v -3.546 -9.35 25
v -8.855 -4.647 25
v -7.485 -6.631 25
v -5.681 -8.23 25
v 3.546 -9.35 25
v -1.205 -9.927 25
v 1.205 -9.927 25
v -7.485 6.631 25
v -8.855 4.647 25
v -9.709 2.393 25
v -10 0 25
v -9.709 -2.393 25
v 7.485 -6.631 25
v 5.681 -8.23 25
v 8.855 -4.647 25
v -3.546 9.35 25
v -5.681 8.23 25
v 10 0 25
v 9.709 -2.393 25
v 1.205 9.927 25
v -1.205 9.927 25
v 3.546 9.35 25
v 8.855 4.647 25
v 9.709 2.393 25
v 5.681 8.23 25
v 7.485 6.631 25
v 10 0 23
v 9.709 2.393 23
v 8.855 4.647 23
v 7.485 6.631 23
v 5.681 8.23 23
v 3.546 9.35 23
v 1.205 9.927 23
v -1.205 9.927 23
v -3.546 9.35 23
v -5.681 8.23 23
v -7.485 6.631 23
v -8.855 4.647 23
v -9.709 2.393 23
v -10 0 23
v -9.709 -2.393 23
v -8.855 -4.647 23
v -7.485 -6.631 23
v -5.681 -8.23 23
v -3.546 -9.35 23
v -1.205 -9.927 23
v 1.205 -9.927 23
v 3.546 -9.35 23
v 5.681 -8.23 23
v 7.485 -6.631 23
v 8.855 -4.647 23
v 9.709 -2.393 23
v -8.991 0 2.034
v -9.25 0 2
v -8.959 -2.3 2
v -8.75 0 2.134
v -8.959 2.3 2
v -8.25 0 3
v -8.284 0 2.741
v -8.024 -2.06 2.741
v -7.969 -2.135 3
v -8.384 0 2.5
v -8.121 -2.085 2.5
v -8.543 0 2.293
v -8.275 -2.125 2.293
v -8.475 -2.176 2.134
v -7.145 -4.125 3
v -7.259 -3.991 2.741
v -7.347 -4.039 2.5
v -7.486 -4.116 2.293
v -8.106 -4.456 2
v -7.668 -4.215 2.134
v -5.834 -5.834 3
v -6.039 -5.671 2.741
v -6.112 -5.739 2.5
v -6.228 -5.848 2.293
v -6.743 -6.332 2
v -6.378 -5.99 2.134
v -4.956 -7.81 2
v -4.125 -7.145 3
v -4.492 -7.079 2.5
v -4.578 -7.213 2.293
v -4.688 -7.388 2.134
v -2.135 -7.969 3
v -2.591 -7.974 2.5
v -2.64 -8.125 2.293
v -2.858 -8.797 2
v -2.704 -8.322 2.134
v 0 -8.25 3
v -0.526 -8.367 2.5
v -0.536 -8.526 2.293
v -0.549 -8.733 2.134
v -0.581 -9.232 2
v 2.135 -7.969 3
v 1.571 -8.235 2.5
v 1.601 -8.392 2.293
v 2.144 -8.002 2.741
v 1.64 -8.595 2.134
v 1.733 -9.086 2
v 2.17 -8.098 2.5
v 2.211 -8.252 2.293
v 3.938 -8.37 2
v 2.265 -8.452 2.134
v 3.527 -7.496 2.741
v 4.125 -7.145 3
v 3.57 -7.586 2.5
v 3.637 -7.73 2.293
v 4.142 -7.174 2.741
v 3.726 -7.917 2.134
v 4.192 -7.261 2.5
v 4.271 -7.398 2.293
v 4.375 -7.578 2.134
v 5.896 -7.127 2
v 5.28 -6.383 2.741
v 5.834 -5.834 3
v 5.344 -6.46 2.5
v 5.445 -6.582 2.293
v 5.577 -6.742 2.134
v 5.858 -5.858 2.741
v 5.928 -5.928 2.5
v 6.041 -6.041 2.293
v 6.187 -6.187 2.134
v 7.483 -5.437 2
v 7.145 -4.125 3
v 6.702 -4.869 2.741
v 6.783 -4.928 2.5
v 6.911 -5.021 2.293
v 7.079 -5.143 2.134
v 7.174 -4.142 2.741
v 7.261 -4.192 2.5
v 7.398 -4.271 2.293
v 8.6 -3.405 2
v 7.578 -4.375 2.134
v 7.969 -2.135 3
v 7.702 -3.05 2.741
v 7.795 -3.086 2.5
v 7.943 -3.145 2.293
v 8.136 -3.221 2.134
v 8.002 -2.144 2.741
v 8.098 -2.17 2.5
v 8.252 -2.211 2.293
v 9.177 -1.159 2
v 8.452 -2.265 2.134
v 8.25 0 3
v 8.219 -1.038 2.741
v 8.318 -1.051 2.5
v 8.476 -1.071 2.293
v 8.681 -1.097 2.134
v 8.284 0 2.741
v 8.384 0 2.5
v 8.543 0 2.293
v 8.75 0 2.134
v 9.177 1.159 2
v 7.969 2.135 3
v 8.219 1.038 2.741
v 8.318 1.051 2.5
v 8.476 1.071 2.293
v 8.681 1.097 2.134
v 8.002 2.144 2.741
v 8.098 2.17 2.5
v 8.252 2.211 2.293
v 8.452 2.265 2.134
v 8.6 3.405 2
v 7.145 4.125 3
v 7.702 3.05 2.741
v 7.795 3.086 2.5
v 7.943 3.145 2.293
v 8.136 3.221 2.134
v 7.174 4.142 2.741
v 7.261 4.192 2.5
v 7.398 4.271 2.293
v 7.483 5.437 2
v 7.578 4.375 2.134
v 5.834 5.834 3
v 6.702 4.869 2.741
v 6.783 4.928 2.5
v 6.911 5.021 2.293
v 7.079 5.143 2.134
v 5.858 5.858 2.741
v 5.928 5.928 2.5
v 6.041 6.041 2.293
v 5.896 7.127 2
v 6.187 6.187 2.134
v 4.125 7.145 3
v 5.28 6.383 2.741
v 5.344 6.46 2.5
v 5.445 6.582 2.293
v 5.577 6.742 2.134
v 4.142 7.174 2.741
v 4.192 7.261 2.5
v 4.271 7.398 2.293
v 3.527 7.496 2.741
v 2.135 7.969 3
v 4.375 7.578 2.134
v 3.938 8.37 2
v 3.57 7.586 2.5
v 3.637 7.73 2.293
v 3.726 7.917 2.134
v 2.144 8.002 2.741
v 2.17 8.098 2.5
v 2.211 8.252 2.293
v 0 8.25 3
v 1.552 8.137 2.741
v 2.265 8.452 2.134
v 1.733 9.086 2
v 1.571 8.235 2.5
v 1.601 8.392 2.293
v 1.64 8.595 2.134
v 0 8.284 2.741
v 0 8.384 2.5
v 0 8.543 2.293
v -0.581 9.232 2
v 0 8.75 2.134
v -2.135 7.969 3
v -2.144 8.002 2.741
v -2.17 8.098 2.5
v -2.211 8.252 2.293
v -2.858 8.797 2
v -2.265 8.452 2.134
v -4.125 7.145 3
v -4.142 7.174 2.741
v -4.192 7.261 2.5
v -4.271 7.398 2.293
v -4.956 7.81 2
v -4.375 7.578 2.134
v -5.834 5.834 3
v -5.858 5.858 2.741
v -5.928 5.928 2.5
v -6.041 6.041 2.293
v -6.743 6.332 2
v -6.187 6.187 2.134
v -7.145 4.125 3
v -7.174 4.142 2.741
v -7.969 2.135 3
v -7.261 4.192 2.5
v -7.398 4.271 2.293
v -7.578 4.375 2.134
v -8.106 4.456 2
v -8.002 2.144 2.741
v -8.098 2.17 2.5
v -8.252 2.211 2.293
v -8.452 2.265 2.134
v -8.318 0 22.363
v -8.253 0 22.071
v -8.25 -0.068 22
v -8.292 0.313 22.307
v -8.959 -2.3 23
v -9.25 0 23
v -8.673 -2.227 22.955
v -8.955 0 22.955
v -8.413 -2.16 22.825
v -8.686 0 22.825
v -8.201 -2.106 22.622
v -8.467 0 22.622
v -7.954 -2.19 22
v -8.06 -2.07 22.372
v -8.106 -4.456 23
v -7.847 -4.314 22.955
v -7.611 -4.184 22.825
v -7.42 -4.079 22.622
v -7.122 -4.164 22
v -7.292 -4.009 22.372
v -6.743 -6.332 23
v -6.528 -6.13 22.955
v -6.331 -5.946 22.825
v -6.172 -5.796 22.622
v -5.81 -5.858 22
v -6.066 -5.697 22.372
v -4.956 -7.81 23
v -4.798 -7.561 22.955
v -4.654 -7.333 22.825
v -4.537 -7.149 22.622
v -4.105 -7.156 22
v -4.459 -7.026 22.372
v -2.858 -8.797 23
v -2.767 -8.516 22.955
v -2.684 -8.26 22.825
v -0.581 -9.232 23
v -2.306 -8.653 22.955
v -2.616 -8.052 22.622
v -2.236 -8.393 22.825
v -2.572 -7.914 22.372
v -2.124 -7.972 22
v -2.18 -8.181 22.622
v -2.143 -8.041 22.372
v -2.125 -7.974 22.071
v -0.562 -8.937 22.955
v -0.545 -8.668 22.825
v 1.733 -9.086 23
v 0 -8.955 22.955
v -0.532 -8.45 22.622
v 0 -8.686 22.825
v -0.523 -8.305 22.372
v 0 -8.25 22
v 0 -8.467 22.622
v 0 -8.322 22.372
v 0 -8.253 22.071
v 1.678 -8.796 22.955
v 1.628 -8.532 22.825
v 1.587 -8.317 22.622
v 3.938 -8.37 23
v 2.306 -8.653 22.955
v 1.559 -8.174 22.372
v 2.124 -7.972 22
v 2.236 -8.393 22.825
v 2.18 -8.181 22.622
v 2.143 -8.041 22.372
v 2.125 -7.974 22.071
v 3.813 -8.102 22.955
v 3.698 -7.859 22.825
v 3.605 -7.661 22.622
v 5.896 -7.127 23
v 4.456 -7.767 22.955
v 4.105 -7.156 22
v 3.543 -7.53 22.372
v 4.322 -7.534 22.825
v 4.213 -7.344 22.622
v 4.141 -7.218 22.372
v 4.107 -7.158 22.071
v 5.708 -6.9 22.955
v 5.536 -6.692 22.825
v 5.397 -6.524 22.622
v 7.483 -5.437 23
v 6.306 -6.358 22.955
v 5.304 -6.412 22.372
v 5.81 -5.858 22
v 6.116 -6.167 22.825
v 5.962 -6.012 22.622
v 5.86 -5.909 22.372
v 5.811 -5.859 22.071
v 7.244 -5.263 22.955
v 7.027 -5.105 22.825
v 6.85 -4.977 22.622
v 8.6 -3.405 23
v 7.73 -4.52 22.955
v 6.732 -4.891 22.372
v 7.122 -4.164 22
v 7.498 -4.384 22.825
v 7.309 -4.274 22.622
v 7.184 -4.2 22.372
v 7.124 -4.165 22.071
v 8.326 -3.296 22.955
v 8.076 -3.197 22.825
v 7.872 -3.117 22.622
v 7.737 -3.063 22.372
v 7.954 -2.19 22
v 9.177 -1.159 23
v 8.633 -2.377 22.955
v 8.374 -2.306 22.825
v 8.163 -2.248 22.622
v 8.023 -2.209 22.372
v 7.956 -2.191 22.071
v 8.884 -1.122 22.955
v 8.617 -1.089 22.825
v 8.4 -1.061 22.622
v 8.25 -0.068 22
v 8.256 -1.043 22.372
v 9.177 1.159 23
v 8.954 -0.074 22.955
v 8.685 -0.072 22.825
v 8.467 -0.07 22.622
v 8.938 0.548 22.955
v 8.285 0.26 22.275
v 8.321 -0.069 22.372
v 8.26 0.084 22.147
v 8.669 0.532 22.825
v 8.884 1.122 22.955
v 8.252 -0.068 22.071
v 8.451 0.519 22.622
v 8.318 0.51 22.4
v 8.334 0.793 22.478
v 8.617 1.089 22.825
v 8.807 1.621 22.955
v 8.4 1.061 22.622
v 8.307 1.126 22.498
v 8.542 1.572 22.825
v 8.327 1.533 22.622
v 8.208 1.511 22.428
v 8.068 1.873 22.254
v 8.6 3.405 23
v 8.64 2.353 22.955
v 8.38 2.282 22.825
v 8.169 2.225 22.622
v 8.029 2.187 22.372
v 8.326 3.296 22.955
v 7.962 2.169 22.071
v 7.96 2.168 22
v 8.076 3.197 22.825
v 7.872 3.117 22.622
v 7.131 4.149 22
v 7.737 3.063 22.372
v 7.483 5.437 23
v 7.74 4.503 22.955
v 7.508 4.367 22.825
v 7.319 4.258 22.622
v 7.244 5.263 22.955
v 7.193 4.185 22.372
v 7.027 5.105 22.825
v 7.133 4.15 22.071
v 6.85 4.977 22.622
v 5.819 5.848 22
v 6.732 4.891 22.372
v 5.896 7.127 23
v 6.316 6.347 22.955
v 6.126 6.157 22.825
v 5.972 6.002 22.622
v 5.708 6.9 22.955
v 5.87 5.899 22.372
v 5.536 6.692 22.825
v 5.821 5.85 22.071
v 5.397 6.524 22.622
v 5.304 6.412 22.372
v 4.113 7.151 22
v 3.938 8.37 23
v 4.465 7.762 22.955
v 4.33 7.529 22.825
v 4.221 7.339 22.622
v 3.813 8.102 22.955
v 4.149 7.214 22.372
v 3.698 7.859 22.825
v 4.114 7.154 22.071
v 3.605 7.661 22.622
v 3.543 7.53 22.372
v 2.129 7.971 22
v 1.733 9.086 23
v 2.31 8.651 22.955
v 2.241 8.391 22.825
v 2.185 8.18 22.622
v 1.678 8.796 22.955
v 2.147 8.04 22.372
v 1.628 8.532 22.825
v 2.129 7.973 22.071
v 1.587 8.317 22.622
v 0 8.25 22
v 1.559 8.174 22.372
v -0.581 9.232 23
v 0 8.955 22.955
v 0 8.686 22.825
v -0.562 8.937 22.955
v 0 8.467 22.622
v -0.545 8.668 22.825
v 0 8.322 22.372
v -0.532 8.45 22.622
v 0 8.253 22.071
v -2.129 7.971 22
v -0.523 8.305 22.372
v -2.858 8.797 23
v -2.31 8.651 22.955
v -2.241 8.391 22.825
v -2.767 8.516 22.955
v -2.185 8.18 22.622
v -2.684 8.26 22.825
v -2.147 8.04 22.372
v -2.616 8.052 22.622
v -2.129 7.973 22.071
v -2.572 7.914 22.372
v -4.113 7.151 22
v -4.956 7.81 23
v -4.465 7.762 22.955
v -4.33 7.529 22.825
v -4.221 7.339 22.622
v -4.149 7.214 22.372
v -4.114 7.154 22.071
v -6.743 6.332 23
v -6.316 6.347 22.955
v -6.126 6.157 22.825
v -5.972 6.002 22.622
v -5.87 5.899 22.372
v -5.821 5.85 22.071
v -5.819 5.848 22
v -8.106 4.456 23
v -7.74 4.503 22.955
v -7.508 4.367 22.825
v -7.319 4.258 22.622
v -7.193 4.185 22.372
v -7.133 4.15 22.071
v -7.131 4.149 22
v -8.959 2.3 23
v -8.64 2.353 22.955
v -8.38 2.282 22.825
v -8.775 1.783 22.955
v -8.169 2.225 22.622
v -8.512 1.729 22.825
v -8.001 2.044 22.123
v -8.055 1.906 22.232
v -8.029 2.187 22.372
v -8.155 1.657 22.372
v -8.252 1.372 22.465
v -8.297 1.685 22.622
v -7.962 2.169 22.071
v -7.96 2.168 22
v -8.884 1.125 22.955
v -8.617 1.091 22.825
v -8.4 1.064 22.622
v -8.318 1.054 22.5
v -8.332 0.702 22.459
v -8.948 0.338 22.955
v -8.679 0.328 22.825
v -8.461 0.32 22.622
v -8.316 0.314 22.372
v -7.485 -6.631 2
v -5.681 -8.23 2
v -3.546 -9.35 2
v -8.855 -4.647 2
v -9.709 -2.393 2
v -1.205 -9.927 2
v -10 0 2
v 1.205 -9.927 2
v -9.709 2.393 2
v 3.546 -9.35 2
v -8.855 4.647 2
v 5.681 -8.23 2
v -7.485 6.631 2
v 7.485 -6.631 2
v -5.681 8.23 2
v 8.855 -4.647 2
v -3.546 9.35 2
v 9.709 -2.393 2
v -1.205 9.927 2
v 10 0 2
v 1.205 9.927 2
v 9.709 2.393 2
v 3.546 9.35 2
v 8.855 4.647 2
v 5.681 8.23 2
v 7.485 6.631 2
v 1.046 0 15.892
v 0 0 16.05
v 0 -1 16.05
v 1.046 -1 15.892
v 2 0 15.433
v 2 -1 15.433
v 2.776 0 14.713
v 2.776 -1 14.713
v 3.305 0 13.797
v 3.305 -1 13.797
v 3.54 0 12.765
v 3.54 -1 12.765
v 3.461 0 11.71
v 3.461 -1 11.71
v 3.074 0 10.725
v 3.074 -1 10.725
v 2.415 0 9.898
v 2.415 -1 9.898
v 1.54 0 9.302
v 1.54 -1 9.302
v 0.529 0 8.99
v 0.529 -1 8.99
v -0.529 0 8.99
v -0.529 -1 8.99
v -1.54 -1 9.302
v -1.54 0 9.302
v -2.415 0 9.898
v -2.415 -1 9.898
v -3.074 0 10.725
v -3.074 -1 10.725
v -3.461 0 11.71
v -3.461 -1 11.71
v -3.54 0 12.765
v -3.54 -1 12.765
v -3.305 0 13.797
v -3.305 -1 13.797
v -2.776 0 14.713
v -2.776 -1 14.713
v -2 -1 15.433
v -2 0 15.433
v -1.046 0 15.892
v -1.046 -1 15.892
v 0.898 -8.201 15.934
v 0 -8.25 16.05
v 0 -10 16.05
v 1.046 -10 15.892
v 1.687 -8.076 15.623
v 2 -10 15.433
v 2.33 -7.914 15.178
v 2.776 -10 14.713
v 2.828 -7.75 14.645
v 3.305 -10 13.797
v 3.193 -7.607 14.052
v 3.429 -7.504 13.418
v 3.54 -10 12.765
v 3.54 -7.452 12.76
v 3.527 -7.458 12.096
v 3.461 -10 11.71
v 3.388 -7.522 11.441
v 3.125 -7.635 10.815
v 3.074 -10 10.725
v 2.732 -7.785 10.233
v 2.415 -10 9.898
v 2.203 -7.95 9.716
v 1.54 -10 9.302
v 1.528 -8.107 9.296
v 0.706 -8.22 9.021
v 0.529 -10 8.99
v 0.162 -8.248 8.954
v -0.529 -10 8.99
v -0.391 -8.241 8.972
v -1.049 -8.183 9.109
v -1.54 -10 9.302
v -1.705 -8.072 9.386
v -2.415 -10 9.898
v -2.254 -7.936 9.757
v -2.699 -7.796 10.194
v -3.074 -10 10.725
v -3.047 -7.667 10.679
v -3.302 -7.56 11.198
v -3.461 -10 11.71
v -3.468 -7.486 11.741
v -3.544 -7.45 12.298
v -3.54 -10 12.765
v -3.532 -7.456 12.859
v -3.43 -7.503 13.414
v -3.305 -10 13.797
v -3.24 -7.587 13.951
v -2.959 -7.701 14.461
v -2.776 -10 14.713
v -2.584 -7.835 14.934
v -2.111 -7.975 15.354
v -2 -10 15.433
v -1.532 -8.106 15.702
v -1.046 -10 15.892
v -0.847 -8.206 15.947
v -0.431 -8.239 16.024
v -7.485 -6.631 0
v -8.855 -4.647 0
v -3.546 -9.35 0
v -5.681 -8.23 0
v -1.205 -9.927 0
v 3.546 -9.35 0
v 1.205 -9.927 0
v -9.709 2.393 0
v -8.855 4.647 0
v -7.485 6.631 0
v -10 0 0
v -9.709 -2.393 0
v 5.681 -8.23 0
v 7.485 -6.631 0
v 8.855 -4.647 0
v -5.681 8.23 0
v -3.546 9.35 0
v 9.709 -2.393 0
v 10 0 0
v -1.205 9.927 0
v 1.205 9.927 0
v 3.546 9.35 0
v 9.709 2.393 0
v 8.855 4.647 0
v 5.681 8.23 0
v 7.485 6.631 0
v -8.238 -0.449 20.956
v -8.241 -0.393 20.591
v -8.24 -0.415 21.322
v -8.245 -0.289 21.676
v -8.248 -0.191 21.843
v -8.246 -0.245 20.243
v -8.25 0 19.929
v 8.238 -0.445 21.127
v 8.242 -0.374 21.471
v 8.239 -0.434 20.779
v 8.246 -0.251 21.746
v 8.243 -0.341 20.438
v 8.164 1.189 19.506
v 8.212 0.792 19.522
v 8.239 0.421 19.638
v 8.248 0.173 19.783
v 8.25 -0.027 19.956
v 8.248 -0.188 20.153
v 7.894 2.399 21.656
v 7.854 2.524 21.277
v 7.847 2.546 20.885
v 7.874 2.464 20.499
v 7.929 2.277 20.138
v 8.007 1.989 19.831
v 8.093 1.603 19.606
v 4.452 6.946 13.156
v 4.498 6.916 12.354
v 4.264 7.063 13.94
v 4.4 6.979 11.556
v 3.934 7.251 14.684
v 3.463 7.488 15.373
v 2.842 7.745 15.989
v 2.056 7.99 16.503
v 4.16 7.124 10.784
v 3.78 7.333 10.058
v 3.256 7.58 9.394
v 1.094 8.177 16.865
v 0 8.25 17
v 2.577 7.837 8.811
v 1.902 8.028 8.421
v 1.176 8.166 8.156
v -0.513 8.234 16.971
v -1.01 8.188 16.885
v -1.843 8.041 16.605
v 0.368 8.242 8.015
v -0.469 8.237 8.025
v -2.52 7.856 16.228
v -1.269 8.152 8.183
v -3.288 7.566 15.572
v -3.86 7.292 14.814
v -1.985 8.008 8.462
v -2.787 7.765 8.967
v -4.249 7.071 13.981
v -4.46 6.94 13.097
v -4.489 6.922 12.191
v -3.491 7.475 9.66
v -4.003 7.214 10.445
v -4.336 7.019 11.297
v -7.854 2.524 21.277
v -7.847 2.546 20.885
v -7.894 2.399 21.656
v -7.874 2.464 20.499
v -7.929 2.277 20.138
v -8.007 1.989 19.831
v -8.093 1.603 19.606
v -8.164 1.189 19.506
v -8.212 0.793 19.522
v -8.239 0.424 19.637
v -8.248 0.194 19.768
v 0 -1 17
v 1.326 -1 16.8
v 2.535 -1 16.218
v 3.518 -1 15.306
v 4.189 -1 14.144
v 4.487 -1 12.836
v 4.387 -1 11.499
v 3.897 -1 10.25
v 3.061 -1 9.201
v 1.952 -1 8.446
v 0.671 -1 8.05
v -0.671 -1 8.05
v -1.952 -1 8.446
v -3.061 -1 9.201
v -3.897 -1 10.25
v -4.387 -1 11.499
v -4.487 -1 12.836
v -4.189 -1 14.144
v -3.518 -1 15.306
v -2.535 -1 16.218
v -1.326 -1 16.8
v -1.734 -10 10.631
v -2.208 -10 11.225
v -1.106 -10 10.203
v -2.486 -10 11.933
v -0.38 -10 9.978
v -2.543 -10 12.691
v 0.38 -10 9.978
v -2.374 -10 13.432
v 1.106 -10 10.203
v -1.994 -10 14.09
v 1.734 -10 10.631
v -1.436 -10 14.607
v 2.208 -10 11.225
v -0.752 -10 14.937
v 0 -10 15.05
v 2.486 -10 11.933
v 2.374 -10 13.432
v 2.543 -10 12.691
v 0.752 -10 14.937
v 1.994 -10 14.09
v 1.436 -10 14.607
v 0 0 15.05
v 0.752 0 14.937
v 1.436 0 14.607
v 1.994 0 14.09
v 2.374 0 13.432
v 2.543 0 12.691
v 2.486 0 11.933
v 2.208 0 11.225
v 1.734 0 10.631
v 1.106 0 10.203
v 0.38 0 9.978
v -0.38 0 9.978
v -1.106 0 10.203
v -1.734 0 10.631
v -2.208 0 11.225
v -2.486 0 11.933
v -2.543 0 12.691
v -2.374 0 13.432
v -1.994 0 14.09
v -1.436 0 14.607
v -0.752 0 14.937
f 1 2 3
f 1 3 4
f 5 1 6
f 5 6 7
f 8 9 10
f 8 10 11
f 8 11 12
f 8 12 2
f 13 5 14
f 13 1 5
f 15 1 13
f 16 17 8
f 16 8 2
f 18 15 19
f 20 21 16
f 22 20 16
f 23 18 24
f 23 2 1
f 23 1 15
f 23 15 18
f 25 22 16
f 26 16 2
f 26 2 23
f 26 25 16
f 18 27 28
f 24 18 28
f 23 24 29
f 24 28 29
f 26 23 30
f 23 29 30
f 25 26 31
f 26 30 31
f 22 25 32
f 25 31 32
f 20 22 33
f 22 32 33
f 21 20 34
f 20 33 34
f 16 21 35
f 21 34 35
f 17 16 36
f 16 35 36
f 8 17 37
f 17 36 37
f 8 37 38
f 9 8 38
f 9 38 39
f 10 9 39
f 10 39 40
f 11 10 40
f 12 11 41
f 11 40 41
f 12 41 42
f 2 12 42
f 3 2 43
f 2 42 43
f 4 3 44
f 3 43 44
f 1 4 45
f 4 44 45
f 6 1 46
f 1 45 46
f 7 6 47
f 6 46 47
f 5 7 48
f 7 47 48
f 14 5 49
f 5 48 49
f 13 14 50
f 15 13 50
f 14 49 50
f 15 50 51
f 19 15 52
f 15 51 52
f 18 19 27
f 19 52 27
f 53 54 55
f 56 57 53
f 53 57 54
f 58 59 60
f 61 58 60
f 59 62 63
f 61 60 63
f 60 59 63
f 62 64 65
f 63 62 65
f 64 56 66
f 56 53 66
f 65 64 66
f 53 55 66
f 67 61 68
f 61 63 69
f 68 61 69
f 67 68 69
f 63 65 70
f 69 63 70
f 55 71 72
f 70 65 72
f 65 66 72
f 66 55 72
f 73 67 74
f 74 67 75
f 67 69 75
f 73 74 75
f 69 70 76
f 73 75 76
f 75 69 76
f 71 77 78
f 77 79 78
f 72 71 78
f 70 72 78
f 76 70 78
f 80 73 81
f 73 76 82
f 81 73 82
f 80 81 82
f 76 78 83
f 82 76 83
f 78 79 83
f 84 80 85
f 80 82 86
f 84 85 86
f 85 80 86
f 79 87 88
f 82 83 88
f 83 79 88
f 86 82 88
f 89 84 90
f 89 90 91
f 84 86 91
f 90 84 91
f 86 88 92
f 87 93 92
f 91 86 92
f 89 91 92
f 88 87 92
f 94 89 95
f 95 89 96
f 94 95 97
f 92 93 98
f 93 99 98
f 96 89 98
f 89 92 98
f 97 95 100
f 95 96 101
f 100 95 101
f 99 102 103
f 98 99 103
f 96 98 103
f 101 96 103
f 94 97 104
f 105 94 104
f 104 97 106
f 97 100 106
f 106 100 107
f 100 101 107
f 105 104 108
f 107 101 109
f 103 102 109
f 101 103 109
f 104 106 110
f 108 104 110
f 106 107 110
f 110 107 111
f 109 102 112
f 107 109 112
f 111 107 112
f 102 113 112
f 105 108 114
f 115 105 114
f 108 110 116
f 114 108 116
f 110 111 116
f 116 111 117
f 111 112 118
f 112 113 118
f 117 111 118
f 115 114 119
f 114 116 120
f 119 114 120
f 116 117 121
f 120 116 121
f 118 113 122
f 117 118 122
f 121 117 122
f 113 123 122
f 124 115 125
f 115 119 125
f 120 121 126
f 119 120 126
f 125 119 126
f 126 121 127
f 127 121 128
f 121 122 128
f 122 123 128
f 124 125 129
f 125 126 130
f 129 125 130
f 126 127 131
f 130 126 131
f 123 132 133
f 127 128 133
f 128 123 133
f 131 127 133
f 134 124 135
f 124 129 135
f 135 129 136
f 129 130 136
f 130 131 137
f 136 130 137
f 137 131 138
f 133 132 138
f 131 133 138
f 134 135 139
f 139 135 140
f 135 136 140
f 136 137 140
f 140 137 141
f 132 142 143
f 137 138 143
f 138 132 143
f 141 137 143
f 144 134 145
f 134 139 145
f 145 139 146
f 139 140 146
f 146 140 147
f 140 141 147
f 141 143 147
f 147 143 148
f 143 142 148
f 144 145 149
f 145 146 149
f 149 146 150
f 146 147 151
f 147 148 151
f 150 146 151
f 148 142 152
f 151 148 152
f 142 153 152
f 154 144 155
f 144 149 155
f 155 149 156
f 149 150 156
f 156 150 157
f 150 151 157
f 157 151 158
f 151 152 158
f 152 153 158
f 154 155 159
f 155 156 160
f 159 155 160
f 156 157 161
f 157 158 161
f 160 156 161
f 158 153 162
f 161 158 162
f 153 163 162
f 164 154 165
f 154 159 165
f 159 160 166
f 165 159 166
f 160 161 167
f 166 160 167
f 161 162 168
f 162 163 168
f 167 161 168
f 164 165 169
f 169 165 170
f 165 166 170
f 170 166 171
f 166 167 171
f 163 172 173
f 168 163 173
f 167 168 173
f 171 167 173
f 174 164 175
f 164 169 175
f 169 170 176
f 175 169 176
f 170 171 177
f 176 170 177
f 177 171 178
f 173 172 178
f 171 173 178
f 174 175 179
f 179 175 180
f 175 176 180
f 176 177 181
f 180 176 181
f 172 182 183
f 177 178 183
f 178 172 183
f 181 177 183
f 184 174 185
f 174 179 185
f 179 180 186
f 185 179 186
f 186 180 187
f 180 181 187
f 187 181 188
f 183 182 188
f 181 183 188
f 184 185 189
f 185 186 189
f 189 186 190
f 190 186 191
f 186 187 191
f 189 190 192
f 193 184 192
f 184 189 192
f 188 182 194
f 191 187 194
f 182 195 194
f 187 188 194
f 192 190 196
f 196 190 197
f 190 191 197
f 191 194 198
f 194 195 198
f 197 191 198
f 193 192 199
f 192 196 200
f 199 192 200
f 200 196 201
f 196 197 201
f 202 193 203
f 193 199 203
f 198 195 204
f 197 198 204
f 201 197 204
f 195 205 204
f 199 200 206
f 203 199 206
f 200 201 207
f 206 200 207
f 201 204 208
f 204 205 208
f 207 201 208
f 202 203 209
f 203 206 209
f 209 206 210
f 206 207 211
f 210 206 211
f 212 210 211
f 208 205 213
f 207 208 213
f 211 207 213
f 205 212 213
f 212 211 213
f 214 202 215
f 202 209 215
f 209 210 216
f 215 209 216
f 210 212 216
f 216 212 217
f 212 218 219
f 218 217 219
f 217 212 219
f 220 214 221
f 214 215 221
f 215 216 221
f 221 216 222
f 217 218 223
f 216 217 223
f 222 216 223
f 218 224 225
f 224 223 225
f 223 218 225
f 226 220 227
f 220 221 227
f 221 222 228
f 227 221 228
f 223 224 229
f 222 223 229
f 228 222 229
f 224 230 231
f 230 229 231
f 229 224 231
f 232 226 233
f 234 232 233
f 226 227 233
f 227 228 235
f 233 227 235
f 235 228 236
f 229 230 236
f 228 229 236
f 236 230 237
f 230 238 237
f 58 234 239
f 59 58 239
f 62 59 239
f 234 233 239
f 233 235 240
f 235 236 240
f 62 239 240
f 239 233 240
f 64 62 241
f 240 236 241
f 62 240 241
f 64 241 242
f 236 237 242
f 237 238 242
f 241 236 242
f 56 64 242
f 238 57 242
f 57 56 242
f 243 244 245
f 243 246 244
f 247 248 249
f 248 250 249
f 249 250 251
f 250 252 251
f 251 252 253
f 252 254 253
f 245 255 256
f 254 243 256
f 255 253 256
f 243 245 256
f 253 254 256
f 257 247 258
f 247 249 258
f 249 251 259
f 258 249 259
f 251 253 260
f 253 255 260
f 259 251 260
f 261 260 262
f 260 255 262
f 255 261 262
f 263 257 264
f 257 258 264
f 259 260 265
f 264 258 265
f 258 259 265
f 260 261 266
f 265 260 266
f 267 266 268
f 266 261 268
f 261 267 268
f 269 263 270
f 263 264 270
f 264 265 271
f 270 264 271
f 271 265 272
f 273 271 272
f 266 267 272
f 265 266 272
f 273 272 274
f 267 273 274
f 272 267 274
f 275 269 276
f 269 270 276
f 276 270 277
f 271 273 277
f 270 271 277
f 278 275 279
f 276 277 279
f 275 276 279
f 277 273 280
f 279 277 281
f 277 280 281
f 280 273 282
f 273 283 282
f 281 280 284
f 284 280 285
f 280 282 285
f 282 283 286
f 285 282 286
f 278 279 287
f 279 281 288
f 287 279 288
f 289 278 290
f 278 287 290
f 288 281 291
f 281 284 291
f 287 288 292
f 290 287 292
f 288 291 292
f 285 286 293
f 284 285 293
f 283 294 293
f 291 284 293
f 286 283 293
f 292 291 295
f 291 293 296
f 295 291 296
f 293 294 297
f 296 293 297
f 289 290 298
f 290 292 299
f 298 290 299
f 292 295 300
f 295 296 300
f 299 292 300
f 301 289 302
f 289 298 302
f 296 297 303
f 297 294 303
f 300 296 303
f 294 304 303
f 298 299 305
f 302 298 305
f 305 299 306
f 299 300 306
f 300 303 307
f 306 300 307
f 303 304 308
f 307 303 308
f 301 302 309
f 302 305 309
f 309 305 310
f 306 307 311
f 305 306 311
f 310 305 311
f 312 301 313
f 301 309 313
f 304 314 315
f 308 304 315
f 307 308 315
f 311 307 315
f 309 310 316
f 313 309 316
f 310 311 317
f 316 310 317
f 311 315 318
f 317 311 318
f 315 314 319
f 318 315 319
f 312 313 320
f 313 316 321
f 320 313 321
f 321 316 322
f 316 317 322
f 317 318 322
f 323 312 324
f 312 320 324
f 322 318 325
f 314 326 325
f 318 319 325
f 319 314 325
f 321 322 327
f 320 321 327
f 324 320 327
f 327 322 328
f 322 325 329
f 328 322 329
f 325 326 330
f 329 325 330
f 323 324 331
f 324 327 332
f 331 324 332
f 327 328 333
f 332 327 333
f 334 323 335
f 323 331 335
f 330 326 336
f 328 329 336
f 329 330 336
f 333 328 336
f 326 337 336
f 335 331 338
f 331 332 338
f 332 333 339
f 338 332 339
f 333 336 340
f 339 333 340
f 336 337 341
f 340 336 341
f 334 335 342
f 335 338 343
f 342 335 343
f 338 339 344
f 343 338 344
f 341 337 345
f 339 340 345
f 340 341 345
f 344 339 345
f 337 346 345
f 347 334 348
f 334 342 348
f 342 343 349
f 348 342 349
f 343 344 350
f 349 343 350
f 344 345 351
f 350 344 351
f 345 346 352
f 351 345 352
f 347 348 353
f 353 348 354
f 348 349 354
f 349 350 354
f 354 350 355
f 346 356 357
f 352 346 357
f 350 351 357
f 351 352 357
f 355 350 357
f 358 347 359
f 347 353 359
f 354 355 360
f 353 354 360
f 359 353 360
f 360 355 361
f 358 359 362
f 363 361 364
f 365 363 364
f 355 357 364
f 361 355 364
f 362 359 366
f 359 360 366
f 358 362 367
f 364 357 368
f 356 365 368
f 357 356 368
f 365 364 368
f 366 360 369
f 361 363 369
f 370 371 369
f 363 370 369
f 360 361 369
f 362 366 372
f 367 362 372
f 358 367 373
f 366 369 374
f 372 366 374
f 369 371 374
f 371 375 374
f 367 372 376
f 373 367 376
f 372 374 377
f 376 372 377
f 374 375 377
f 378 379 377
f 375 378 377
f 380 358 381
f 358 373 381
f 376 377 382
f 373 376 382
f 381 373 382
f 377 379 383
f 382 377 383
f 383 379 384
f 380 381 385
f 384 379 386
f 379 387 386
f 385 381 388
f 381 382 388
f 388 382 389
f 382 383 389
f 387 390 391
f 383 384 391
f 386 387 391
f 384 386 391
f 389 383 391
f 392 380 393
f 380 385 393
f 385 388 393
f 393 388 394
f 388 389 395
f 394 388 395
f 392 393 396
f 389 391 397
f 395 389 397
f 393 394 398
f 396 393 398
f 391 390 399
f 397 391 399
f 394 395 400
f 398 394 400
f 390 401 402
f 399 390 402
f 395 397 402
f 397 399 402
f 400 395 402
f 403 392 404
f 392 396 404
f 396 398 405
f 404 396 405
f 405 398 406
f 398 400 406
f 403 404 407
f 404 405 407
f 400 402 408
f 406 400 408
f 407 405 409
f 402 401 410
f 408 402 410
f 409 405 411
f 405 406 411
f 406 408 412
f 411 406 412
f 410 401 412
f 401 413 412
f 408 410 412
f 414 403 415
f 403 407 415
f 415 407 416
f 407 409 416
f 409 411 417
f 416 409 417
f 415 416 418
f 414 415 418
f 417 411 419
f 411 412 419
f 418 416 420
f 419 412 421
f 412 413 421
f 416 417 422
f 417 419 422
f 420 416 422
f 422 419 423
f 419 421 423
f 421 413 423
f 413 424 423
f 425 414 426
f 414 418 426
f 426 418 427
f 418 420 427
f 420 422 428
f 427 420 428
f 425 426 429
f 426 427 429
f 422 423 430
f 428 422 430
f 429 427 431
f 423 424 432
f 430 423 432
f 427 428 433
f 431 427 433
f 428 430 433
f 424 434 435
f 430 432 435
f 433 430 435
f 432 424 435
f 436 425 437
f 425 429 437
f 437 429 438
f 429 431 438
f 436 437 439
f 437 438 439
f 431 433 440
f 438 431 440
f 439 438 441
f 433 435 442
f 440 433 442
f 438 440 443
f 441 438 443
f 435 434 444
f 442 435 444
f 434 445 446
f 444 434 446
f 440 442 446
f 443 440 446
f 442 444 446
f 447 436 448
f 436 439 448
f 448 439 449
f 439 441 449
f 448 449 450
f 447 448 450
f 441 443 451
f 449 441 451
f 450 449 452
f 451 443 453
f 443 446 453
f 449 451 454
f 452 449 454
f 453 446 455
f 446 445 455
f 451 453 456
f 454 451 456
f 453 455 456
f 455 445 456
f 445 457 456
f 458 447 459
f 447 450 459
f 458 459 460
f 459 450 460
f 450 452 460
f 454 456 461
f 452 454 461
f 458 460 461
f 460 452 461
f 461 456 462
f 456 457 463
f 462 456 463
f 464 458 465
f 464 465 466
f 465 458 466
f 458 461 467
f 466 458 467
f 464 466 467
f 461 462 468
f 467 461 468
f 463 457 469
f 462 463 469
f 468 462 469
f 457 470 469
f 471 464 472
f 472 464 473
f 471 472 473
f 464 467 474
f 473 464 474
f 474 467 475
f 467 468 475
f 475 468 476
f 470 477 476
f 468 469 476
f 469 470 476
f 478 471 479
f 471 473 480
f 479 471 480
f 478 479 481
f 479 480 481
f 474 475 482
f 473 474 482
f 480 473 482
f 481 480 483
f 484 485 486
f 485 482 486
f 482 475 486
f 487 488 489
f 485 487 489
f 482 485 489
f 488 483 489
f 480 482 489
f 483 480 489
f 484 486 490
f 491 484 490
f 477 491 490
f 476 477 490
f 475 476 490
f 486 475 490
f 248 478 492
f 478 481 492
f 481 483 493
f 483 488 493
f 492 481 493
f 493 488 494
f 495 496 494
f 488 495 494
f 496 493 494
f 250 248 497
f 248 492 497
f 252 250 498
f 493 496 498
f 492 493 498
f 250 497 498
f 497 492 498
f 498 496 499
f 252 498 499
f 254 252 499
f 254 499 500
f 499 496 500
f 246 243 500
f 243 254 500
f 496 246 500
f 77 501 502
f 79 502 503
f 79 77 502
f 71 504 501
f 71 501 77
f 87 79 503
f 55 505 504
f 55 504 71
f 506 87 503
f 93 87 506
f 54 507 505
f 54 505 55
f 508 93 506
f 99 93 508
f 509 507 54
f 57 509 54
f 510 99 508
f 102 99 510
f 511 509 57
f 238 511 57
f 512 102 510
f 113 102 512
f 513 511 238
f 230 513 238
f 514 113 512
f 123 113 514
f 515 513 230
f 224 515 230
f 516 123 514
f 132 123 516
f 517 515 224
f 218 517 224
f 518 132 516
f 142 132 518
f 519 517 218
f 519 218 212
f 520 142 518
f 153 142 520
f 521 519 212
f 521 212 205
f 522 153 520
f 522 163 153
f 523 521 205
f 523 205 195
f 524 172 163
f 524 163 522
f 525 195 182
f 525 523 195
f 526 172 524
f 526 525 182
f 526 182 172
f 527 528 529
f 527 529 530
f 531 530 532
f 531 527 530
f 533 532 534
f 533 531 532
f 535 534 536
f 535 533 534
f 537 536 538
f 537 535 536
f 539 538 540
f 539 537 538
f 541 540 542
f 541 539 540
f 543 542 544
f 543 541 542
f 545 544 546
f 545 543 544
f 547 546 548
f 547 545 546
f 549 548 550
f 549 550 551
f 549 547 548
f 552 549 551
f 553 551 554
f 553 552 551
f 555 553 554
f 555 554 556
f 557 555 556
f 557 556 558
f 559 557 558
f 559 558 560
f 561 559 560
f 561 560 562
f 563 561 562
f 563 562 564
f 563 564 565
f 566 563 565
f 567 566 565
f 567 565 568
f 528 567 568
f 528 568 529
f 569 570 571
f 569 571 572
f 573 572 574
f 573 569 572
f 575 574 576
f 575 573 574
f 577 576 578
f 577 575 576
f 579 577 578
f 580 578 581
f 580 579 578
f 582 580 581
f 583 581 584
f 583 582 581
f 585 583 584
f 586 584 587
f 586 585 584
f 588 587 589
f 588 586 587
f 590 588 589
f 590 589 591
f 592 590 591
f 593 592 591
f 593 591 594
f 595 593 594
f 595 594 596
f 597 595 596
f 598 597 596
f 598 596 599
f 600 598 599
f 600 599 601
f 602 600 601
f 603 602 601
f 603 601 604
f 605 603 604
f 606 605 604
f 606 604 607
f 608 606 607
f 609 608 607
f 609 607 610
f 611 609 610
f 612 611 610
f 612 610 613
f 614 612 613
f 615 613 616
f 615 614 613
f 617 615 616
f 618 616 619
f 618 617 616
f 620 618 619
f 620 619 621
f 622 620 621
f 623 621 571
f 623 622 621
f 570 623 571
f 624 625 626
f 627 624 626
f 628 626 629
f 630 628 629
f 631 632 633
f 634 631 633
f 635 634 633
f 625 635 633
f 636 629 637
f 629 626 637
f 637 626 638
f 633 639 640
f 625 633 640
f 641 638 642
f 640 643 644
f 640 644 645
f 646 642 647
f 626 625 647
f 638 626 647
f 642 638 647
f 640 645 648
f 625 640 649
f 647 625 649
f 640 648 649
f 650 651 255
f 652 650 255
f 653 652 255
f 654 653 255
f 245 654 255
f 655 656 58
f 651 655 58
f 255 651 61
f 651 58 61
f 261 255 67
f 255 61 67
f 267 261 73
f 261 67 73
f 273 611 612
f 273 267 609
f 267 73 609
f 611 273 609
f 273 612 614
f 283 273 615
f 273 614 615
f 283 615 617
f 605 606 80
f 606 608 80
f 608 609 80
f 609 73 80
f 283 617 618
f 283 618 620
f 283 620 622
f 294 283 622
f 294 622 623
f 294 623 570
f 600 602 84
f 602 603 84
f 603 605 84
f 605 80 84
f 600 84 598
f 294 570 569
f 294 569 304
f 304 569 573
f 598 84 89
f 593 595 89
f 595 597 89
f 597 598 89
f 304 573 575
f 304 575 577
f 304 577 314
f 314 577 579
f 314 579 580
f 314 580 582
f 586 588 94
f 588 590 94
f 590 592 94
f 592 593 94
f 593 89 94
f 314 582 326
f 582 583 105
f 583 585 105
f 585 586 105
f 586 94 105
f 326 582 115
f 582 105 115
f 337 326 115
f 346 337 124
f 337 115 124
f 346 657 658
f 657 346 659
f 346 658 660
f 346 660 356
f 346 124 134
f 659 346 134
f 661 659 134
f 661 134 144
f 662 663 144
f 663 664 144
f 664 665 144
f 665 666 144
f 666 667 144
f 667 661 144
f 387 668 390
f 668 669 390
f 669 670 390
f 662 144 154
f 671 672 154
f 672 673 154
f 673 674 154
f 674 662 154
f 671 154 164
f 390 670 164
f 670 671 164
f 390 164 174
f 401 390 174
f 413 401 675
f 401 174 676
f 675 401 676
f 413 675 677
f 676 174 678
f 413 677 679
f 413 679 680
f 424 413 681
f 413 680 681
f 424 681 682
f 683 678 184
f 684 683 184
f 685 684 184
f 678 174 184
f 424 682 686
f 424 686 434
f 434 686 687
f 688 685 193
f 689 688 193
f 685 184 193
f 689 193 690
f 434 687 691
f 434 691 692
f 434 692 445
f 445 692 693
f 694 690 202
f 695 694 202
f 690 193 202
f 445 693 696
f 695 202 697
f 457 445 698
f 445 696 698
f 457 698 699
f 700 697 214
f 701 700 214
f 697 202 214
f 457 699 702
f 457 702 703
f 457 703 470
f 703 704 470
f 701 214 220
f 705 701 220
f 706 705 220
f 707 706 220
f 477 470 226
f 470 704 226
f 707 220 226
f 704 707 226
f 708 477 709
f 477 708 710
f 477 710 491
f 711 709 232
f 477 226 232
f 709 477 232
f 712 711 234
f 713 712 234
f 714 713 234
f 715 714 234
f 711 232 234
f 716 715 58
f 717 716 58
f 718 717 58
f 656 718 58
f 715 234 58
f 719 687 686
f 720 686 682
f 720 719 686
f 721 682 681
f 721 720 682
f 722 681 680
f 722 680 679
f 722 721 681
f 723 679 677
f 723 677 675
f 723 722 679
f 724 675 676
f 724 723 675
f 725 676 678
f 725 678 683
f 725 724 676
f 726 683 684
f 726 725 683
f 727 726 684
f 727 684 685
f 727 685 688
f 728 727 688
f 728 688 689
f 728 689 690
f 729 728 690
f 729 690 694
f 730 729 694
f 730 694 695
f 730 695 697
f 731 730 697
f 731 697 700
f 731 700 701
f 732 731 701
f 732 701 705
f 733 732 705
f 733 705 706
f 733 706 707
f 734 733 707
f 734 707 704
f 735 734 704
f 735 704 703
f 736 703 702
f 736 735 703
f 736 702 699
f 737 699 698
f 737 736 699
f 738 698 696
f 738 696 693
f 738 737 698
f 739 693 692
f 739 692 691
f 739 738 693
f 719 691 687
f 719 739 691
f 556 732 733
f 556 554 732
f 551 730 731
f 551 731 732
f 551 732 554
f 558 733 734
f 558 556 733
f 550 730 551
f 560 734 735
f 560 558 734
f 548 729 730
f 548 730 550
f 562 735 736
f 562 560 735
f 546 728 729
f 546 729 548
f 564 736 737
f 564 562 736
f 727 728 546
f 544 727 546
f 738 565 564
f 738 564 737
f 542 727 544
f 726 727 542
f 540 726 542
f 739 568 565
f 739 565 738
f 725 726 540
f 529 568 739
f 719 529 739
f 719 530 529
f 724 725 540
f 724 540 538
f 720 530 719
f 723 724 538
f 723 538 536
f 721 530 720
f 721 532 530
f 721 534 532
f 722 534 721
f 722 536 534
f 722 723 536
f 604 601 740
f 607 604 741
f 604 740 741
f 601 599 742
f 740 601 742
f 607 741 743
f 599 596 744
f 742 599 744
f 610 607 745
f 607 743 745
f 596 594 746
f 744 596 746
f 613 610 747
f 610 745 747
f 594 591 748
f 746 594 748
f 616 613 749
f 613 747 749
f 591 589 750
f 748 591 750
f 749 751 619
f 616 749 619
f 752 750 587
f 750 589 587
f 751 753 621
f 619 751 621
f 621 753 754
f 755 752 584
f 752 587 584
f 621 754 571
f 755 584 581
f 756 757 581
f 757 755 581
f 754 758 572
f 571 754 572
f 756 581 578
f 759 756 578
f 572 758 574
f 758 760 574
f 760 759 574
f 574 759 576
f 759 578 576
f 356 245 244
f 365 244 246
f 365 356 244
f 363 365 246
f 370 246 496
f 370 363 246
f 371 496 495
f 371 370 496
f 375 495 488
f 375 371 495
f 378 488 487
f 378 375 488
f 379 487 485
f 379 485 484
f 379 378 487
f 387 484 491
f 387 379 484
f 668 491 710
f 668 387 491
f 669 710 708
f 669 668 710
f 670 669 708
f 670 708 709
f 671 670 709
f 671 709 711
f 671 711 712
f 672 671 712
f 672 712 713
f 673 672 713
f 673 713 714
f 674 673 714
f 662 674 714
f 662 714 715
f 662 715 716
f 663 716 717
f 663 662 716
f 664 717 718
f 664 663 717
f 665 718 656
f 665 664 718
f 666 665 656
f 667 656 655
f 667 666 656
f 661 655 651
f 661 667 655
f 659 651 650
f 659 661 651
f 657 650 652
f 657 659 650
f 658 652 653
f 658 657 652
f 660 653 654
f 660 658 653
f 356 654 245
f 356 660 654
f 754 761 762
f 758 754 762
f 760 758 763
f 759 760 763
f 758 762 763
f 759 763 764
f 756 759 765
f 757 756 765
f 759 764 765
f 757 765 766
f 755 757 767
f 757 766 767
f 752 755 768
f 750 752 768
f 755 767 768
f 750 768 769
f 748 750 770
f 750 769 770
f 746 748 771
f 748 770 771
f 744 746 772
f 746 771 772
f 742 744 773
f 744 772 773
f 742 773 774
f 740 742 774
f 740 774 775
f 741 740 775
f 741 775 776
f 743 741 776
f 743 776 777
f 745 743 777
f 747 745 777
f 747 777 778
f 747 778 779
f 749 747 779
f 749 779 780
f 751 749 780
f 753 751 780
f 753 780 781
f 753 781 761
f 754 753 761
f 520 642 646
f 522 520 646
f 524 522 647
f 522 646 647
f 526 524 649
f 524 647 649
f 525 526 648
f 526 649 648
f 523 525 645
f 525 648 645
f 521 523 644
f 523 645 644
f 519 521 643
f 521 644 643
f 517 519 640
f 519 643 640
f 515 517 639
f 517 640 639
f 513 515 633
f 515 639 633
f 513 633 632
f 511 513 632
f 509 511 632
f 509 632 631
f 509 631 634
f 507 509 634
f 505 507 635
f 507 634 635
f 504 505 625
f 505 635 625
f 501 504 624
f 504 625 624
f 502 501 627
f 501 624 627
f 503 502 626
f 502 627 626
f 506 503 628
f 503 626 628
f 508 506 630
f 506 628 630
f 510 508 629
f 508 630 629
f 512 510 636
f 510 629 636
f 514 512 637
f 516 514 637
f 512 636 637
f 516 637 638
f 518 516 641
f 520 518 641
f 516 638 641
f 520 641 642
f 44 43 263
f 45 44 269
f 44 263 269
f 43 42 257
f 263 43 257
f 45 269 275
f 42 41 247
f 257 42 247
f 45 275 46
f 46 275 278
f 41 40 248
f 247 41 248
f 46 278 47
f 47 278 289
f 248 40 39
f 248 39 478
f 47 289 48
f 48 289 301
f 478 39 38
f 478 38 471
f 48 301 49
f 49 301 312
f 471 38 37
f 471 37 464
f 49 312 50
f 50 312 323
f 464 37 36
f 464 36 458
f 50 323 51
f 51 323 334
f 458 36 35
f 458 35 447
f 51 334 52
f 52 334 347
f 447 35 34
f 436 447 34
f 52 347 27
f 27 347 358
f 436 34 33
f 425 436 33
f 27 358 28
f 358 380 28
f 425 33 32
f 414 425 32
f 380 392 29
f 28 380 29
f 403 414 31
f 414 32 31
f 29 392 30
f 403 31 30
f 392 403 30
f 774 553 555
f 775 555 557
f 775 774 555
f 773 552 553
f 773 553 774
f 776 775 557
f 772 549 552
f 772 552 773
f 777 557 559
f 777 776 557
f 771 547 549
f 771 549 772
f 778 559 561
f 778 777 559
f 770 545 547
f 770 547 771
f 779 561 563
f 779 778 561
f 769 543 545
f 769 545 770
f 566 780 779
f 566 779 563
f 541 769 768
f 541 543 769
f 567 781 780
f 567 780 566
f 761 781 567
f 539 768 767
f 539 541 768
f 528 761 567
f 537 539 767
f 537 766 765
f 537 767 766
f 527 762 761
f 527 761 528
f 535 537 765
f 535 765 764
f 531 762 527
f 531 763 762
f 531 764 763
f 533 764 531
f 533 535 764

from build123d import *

# Parameters (mm, degrees)
SKIZZE1_R                            = 10
AUFSATZ_LINEAR_AUSTRAGEN1_DEPTH      = 2
SKIZZE2_R                            = 8.25
AUFSATZ_LINEAR_AUSTRAGEN2_DEPTH      = 21
SKIZZE3_R                            = 10
AUFSATZ_LINEAR_AUSTRAGEN3_DEPTH      = 2
VERRUNDUNG1_R                        = 1
SCHNITT_LINEAR_AUSTRAGEN1_DEPTH      = 14
SCHNITT_LINEAR_AUSTRAGEN1_DEPTH_BACK = 14
SKIZZE4_R                            = 1.5
SCHNITT_LINEAR_AUSTRAGEN2_DEPTH      = 14
SCHNITT_LINEAR_AUSTRAGEN2_DEPTH_BACK = 1
SKIZZE5_R                            = 4.5
SKIZZE6_R                            = 2.55
SCHNITT_LINEAR_AUSTRAGEN3_DEPTH      = 14
SKIZZE7_R                            = 3.55
SKIZZE7_R_2                          = 2.55
AUFSATZ_LINEAR_AUSTRAGEN4_DEPTH      = 10


with BuildPart() as part:
    # Skizze1 → Aufsatz-Linear austragen1 (new body)
    with BuildSketch(Plane.XY):
        Circle(SKIZZE1_R)
    extrude(amount=AUFSATZ_LINEAR_AUSTRAGEN1_DEPTH)

    # Skizze2 → Aufsatz-Linear austragen2 (add)
    with BuildSketch(Plane.XY.offset(2)):
        Circle(SKIZZE2_R)
    extrude(amount=AUFSATZ_LINEAR_AUSTRAGEN2_DEPTH)

    # Skizze3 → Aufsatz-Linear austragen3 (add)
    with BuildSketch(Plane.XY.offset(23)):
        Circle(SKIZZE3_R)
    extrude(amount=AUFSATZ_LINEAR_AUSTRAGEN3_DEPTH)

    # Verrundung1
    verrundung1_edges = [part.edges().sort_by_distance(p)[0] for p in [
        (-8.25, 0, 23),
        (-8.25, 0, 2),
    ]]
    fillet(verrundung1_edges, radius=VERRUNDUNG1_R)

    # Skizze4 → Schnitt-Linear austragen1 (cut, two sides: drawn at the far end of the back side and taken through both)
    with BuildSketch(Plane.ZY.offset(-SCHNITT_LINEAR_AUSTRAGEN1_DEPTH_BACK)):
        with Locations((21, 1.05)):
            Circle(SKIZZE4_R)
    extrude(amount=SCHNITT_LINEAR_AUSTRAGEN1_DEPTH + SCHNITT_LINEAR_AUSTRAGEN1_DEPTH_BACK, mode=Mode.SUBTRACT)

    # Skizze5 → Schnitt-Linear austragen2 (cut, two sides: drawn at the far end of the back side and taken through both)
    with BuildSketch(Plane(origin=(0, 0, 0), x_dir=(1, 0, 0), z_dir=(0, 1, 0)).offset(-SCHNITT_LINEAR_AUSTRAGEN2_DEPTH_BACK)):
        with Locations((0, -12.5)):
            Circle(SKIZZE5_R)
    extrude(amount=SCHNITT_LINEAR_AUSTRAGEN2_DEPTH + SCHNITT_LINEAR_AUSTRAGEN2_DEPTH_BACK, mode=Mode.SUBTRACT)

    # Skizze6 → Schnitt-Linear austragen3 (cut)
    with BuildSketch(Plane(origin=(0, -1, 0), x_dir=(1, 0, 0), z_dir=(0, 1, 0))):
        with Locations((0, -12.5)):
            Circle(SKIZZE6_R)
    extrude(amount=-SCHNITT_LINEAR_AUSTRAGEN3_DEPTH, mode=Mode.SUBTRACT)

    # Skizze7 → Aufsatz-Linear austragen4 (add)
    with BuildSketch(Plane(origin=(0, 0, 0), x_dir=(1, 0, 0), z_dir=(0, 1, 0))):
        with Locations((0, -12.5)):
            Circle(SKIZZE7_R)
        with Locations((0, -12.5)):
            Circle(SKIZZE7_R_2, mode=Mode.SUBTRACT)
    extrude(amount=-AUFSATZ_LINEAR_AUSTRAGEN4_DEPTH)


solid = part.part
